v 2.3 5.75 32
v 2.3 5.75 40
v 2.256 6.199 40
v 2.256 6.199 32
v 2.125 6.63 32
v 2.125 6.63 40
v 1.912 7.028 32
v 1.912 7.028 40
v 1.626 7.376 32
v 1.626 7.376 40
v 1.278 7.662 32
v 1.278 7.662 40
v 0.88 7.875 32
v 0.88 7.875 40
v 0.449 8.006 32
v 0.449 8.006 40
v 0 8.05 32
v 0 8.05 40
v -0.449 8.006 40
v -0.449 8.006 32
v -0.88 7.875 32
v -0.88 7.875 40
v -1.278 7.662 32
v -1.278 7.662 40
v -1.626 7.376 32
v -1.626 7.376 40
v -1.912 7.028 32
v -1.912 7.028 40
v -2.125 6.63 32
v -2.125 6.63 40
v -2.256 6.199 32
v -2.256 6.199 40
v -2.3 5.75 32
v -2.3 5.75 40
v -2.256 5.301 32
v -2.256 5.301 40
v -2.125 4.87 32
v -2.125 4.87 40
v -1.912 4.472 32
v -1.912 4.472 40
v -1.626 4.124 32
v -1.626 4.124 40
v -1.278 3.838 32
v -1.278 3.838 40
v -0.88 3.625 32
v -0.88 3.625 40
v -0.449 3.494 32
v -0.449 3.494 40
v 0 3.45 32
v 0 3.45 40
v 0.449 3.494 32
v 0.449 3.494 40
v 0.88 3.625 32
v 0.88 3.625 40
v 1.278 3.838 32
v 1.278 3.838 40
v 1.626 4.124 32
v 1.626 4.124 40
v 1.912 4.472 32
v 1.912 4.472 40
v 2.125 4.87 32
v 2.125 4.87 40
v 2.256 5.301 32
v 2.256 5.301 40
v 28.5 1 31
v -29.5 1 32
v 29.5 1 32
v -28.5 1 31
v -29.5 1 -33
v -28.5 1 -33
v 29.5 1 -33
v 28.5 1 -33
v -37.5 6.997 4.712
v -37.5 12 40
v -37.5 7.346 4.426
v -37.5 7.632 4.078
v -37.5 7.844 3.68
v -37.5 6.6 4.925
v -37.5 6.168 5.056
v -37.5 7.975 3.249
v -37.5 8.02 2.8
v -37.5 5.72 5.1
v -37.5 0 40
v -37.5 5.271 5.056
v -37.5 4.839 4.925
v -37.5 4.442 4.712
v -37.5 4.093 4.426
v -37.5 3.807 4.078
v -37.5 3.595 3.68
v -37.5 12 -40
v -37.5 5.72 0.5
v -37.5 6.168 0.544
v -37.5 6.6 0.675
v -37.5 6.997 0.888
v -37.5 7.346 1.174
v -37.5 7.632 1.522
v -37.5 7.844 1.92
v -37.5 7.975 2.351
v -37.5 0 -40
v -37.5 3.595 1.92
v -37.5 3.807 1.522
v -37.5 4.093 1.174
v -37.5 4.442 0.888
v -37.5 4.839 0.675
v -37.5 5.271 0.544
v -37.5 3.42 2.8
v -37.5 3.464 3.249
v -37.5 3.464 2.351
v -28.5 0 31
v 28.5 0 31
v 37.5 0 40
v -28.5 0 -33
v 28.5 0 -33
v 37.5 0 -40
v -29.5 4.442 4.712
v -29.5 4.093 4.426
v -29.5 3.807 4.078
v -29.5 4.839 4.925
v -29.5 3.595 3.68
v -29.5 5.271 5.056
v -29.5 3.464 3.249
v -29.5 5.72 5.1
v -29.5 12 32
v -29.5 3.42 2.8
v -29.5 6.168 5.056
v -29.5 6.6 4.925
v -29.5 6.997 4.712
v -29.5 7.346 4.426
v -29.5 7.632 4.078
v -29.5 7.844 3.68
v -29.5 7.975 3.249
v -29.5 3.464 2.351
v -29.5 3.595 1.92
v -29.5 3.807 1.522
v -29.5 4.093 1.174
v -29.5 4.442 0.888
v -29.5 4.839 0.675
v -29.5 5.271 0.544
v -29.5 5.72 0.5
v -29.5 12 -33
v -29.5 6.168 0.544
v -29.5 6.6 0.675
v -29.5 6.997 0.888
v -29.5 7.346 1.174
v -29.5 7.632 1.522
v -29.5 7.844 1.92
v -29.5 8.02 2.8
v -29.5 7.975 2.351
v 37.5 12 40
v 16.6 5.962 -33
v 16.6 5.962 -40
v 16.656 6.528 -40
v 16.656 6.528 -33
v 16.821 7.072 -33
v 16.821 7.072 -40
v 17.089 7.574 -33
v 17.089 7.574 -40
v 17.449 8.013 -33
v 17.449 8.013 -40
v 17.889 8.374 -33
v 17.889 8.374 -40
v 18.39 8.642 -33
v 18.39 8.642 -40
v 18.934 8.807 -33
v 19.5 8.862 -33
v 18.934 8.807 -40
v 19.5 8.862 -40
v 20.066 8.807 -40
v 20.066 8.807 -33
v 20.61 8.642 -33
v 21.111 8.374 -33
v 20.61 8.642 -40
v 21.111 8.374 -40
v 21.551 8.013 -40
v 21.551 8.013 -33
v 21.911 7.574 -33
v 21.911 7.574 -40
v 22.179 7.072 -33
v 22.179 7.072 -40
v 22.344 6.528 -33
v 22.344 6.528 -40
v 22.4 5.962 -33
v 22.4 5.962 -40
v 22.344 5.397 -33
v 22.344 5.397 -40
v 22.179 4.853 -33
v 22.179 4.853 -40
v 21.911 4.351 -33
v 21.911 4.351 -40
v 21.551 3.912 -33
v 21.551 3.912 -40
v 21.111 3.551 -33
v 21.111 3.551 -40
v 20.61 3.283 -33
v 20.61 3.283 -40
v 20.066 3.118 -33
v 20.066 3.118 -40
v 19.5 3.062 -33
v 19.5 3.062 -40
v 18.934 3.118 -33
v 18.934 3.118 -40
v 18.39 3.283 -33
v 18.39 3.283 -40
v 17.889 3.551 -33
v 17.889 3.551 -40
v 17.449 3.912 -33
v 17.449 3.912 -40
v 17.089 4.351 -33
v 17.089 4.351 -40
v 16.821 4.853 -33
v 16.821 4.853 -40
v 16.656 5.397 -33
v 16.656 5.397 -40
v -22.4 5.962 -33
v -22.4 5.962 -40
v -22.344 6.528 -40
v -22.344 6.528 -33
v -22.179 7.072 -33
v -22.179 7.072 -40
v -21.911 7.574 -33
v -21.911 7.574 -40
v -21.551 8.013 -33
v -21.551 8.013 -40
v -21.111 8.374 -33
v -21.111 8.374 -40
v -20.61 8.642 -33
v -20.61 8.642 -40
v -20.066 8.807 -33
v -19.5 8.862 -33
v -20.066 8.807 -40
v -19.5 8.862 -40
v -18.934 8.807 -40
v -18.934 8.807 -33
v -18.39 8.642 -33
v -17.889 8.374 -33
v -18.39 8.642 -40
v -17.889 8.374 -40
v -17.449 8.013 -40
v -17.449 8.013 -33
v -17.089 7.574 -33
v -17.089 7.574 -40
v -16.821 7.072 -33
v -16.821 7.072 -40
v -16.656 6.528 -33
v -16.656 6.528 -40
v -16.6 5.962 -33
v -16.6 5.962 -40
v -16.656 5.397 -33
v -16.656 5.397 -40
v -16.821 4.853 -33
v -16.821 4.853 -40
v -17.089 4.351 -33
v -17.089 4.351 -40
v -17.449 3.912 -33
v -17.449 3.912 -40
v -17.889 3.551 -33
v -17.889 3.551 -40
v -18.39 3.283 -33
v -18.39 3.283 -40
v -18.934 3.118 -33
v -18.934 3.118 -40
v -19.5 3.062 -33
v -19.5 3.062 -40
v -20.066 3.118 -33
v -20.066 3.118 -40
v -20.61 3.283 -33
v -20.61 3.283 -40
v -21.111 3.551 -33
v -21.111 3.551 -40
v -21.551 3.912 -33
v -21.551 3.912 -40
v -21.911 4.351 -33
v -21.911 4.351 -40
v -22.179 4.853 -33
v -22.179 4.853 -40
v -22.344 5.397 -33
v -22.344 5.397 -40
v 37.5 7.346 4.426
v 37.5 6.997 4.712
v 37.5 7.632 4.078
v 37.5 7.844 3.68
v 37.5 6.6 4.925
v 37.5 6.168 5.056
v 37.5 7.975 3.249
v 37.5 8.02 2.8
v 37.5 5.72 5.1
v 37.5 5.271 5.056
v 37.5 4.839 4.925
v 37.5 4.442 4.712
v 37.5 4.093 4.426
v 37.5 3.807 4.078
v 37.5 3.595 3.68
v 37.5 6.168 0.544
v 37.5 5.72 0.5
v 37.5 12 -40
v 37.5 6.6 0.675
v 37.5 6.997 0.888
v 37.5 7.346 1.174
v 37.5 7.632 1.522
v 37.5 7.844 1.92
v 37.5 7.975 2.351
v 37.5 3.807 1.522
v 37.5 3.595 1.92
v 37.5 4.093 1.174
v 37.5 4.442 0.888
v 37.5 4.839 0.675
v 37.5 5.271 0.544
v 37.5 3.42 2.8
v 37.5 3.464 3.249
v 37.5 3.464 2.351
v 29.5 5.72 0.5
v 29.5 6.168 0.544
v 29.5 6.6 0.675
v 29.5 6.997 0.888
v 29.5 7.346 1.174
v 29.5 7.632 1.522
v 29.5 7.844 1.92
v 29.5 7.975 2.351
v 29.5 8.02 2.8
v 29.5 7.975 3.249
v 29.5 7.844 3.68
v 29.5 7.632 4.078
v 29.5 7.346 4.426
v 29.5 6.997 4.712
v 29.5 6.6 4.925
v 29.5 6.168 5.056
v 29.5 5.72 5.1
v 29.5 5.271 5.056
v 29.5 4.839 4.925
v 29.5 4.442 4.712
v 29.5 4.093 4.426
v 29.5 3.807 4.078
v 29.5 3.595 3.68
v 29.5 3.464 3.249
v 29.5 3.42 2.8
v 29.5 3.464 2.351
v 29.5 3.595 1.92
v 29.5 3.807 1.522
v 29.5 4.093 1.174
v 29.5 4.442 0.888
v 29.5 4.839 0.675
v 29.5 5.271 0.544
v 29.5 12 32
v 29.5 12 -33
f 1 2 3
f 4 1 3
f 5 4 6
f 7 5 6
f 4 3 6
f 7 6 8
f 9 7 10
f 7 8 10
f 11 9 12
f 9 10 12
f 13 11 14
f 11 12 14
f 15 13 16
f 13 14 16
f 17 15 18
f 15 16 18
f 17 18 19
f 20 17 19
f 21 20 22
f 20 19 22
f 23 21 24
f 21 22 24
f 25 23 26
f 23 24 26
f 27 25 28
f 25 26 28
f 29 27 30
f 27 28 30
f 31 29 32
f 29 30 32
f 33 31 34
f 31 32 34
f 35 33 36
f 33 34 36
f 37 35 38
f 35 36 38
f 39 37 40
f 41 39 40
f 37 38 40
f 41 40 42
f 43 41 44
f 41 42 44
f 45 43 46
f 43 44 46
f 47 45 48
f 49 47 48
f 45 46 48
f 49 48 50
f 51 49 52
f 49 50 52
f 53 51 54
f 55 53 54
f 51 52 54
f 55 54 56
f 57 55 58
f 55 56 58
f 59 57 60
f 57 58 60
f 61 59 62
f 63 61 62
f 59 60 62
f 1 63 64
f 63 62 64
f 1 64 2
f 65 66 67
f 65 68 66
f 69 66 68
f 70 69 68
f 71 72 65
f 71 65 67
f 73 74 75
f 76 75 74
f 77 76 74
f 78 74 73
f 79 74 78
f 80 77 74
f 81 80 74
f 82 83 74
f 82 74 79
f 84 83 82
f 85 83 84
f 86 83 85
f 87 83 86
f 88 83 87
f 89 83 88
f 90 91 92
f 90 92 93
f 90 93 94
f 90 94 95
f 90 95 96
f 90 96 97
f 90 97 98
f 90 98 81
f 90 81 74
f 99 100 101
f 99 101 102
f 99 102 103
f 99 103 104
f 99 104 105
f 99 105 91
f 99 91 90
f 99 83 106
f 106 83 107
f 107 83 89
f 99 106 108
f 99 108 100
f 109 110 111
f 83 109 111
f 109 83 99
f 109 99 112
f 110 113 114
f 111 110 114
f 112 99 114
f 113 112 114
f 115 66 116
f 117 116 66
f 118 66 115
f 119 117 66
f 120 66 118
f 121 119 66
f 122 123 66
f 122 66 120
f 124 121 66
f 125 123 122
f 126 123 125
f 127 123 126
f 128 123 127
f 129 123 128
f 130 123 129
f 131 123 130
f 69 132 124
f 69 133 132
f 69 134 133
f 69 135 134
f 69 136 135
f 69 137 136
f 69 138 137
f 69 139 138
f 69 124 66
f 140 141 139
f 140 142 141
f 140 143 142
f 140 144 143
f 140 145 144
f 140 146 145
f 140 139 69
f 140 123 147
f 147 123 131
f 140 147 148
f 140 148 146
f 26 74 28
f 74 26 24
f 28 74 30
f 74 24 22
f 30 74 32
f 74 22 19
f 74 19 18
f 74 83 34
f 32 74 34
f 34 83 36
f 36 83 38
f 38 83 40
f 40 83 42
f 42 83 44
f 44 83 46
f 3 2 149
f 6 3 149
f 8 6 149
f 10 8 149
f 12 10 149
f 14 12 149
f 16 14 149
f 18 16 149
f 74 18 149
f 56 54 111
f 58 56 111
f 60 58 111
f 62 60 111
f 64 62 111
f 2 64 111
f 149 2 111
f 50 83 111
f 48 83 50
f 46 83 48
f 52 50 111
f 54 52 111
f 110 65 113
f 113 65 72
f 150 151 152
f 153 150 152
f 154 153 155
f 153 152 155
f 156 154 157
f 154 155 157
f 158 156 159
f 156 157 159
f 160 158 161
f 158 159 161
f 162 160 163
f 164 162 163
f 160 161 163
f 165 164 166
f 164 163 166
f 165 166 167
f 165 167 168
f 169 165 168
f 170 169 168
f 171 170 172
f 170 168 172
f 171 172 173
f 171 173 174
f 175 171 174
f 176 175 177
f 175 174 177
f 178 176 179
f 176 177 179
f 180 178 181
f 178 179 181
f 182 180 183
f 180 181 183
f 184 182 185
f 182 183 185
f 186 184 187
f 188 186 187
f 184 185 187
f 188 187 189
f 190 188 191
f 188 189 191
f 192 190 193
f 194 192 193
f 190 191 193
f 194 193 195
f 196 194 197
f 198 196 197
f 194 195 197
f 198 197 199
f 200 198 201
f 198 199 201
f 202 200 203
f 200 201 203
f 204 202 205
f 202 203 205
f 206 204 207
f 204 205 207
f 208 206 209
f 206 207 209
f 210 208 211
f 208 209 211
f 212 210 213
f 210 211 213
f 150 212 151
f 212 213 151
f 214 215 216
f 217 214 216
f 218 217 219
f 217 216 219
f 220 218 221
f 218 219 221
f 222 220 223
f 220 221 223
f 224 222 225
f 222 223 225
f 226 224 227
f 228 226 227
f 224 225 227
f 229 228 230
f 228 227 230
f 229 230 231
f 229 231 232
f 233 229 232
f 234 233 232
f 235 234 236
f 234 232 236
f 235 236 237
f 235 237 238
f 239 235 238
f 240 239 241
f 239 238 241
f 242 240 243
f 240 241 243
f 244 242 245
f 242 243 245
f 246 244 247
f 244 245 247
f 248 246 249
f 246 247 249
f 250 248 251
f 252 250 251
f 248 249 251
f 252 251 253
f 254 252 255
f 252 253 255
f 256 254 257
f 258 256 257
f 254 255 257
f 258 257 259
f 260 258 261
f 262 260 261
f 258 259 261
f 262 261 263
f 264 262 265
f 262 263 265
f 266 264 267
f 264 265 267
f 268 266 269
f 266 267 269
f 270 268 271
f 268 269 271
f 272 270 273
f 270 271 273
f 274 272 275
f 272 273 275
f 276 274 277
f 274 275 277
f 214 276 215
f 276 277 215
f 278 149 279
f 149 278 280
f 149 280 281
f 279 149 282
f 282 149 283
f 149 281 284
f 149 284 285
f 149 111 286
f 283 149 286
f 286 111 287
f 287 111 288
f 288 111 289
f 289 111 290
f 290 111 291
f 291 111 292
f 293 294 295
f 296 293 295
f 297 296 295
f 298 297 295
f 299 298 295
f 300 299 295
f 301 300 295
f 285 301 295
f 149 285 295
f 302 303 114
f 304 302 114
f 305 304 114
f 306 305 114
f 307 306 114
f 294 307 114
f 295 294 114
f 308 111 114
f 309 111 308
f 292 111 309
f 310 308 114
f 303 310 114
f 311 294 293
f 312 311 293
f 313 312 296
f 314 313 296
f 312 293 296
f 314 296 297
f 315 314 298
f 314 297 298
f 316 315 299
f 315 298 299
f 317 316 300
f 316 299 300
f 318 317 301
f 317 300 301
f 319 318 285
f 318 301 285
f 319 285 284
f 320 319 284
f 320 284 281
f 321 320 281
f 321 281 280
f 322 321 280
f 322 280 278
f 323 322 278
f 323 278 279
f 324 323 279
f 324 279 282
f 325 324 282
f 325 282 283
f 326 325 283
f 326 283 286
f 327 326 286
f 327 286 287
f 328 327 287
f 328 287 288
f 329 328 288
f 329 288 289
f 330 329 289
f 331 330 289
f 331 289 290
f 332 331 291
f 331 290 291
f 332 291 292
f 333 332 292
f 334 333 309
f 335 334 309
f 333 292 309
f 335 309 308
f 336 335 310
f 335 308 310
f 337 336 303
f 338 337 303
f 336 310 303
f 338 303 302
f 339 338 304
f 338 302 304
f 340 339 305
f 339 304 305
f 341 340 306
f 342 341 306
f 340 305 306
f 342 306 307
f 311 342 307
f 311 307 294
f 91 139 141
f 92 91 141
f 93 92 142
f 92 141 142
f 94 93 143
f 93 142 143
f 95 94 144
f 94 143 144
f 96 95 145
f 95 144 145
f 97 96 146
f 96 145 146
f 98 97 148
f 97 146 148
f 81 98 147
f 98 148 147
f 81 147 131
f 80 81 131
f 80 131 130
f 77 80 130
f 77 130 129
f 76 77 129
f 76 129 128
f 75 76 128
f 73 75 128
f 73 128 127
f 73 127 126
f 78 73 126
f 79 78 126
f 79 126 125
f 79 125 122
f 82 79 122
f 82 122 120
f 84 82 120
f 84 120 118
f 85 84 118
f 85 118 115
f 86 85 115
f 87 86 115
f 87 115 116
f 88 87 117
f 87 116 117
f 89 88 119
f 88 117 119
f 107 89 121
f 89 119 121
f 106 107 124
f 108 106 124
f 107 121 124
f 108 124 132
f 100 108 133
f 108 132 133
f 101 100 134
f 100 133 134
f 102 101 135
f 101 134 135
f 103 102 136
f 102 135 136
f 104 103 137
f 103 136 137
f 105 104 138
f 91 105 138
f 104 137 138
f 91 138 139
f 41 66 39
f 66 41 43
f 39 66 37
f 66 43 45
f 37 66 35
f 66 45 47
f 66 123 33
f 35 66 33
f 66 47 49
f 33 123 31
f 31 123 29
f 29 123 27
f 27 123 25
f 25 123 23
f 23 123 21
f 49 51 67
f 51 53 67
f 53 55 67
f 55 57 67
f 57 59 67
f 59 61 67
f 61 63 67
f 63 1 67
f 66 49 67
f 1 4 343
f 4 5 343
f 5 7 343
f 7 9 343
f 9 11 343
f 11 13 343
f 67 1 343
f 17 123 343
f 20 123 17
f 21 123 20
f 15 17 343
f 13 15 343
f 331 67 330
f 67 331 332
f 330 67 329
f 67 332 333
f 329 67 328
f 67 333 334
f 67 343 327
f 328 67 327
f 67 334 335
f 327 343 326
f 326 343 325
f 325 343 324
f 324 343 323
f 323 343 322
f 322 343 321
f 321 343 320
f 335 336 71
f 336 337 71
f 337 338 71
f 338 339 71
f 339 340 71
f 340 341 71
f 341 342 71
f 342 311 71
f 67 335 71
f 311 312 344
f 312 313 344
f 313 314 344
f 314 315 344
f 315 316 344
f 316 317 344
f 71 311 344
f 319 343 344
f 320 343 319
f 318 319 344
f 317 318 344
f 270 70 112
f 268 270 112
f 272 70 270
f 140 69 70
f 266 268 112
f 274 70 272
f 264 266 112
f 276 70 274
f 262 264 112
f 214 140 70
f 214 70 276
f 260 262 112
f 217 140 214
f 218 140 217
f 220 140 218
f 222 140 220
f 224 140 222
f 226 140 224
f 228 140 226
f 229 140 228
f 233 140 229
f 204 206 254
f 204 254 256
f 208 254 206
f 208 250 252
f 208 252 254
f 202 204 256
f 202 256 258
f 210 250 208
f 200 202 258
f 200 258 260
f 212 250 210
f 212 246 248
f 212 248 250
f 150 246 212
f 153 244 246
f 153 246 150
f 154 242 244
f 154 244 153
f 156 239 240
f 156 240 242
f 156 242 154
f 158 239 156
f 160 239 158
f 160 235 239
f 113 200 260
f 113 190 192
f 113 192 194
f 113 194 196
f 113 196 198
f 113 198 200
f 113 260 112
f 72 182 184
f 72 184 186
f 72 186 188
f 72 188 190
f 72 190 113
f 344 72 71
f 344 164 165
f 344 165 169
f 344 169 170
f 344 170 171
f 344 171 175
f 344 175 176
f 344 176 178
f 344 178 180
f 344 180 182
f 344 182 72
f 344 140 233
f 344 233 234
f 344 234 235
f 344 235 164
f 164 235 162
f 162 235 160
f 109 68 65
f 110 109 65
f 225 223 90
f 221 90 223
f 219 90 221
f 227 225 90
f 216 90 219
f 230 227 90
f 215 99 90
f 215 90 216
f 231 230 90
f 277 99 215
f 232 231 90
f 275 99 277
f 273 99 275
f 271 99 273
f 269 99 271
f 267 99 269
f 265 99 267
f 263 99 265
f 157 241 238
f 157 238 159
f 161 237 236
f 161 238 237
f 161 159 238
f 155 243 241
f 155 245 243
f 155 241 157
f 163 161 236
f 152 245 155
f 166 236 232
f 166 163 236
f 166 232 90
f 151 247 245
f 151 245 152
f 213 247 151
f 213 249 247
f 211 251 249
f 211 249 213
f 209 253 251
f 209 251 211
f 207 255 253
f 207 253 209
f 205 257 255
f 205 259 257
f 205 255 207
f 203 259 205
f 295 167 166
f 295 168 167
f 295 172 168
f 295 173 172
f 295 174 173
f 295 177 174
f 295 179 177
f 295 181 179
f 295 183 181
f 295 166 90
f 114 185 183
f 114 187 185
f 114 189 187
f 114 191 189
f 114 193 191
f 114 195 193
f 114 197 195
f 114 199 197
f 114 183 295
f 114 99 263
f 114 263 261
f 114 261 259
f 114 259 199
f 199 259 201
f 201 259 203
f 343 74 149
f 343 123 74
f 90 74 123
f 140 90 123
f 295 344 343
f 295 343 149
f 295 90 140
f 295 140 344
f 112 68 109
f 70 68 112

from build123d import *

# Parameters (mm, degrees)
SKETCH1_W           = 75
SKETCH1_H           = 80
BOSS_EXTRUDE1_DEPTH = 12
SKETCH2_W           = 59
SKETCH2_H           = 65
CUT_EXTRUDE1_DEPTH  = 11
SKETCH3_W           = 55
SKETCH3_H           = 63
CUT_EXTRUDE2_DEPTH  = 56.921820428
SKETCH5_R           = 2.9
CUT_EXTRUDE4_DEPTH  = 7
SKETCH7_W           = 57
SKETCH7_H           = 64
CUT_EXTRUDE5_DEPTH  = 56.921820428
SKETCH9_R           = 2.3
CUT_EXTRUDE6_DEPTH  = 8
SKETCH10_R          = 2.3
CUT_EXTRUDE7_DEPTH  = 86.842879728


with BuildPart() as part:
    # Sketch1 → Boss-Extrude1 (new body)
    with BuildSketch(Plane(origin=(0, 0, 0), x_dir=(1, 0, 0), z_dir=(0, 1, 0))):
        Rectangle(SKETCH1_W, SKETCH1_H)
    extrude(amount=BOSS_EXTRUDE1_DEPTH)

    # Sketch2 → Cut-Extrude1 (cut)
    with BuildSketch(Plane(origin=(0, 12, 0), x_dir=(1, 0, 0), z_dir=(0, 1, 0))):
        with Locations((0, 0.5)):
            Rectangle(SKETCH2_W, SKETCH2_H)
    extrude(amount=-CUT_EXTRUDE1_DEPTH, mode=Mode.SUBTRACT)

    # Sketch3 → Cut-Extrude2 (cut, through all)
    with BuildSketch(Plane(origin=(0, 1, 0), x_dir=(1, 0, 0), z_dir=(0, 1, 0))):
        with Locations((0, 1.5)):
            Rectangle(SKETCH3_W, SKETCH3_H)
    extrude(amount=-CUT_EXTRUDE2_DEPTH, mode=Mode.SUBTRACT)

    # Sketch5 → Cut-Extrude4 (cut)
    with BuildSketch(Plane(origin=(0, 0, -40), x_dir=(-1, 0, 0), z_dir=(0, 0, -1))):
        with Locations((-19.5, 5.962429795)):
            Circle(SKETCH5_R)
        with Locations((19.5, 5.962429795)):
            Circle(SKETCH5_R)
    extrude(amount=-CUT_EXTRUDE4_DEPTH, mode=Mode.SUBTRACT)

    # Sketch7 → Cut-Extrude5 (cut, through all)
    with BuildSketch(Plane(origin=(0, 1, 0), x_dir=(1, 0, 0), z_dir=(0, 1, 0))):
        with Locations((0, 1)):
            Rectangle(SKETCH7_W, SKETCH7_H)
    extrude(amount=-CUT_EXTRUDE5_DEPTH, mode=Mode.SUBTRACT)

    # Sketch9 → Cut-Extrude6 (cut)
    with BuildSketch(Plane.XY.offset(40)):
        with Locations((0, 5.75)):
            Circle(SKETCH9_R)
    extrude(amount=-CUT_EXTRUDE6_DEPTH, mode=Mode.SUBTRACT)

    # Sketch10 → Cut-Extrude7 (cut, through all)
    with BuildSketch(Plane(origin=(37.5, 0, 0), x_dir=(0, 0, -1), z_dir=(1, 0, 0))):
        with Locations((-2.8, 5.719569138)):
            Circle(SKETCH10_R)
    extrude(amount=-CUT_EXTRUDE7_DEPTH, mode=Mode.SUBTRACT)


solid = part.part
